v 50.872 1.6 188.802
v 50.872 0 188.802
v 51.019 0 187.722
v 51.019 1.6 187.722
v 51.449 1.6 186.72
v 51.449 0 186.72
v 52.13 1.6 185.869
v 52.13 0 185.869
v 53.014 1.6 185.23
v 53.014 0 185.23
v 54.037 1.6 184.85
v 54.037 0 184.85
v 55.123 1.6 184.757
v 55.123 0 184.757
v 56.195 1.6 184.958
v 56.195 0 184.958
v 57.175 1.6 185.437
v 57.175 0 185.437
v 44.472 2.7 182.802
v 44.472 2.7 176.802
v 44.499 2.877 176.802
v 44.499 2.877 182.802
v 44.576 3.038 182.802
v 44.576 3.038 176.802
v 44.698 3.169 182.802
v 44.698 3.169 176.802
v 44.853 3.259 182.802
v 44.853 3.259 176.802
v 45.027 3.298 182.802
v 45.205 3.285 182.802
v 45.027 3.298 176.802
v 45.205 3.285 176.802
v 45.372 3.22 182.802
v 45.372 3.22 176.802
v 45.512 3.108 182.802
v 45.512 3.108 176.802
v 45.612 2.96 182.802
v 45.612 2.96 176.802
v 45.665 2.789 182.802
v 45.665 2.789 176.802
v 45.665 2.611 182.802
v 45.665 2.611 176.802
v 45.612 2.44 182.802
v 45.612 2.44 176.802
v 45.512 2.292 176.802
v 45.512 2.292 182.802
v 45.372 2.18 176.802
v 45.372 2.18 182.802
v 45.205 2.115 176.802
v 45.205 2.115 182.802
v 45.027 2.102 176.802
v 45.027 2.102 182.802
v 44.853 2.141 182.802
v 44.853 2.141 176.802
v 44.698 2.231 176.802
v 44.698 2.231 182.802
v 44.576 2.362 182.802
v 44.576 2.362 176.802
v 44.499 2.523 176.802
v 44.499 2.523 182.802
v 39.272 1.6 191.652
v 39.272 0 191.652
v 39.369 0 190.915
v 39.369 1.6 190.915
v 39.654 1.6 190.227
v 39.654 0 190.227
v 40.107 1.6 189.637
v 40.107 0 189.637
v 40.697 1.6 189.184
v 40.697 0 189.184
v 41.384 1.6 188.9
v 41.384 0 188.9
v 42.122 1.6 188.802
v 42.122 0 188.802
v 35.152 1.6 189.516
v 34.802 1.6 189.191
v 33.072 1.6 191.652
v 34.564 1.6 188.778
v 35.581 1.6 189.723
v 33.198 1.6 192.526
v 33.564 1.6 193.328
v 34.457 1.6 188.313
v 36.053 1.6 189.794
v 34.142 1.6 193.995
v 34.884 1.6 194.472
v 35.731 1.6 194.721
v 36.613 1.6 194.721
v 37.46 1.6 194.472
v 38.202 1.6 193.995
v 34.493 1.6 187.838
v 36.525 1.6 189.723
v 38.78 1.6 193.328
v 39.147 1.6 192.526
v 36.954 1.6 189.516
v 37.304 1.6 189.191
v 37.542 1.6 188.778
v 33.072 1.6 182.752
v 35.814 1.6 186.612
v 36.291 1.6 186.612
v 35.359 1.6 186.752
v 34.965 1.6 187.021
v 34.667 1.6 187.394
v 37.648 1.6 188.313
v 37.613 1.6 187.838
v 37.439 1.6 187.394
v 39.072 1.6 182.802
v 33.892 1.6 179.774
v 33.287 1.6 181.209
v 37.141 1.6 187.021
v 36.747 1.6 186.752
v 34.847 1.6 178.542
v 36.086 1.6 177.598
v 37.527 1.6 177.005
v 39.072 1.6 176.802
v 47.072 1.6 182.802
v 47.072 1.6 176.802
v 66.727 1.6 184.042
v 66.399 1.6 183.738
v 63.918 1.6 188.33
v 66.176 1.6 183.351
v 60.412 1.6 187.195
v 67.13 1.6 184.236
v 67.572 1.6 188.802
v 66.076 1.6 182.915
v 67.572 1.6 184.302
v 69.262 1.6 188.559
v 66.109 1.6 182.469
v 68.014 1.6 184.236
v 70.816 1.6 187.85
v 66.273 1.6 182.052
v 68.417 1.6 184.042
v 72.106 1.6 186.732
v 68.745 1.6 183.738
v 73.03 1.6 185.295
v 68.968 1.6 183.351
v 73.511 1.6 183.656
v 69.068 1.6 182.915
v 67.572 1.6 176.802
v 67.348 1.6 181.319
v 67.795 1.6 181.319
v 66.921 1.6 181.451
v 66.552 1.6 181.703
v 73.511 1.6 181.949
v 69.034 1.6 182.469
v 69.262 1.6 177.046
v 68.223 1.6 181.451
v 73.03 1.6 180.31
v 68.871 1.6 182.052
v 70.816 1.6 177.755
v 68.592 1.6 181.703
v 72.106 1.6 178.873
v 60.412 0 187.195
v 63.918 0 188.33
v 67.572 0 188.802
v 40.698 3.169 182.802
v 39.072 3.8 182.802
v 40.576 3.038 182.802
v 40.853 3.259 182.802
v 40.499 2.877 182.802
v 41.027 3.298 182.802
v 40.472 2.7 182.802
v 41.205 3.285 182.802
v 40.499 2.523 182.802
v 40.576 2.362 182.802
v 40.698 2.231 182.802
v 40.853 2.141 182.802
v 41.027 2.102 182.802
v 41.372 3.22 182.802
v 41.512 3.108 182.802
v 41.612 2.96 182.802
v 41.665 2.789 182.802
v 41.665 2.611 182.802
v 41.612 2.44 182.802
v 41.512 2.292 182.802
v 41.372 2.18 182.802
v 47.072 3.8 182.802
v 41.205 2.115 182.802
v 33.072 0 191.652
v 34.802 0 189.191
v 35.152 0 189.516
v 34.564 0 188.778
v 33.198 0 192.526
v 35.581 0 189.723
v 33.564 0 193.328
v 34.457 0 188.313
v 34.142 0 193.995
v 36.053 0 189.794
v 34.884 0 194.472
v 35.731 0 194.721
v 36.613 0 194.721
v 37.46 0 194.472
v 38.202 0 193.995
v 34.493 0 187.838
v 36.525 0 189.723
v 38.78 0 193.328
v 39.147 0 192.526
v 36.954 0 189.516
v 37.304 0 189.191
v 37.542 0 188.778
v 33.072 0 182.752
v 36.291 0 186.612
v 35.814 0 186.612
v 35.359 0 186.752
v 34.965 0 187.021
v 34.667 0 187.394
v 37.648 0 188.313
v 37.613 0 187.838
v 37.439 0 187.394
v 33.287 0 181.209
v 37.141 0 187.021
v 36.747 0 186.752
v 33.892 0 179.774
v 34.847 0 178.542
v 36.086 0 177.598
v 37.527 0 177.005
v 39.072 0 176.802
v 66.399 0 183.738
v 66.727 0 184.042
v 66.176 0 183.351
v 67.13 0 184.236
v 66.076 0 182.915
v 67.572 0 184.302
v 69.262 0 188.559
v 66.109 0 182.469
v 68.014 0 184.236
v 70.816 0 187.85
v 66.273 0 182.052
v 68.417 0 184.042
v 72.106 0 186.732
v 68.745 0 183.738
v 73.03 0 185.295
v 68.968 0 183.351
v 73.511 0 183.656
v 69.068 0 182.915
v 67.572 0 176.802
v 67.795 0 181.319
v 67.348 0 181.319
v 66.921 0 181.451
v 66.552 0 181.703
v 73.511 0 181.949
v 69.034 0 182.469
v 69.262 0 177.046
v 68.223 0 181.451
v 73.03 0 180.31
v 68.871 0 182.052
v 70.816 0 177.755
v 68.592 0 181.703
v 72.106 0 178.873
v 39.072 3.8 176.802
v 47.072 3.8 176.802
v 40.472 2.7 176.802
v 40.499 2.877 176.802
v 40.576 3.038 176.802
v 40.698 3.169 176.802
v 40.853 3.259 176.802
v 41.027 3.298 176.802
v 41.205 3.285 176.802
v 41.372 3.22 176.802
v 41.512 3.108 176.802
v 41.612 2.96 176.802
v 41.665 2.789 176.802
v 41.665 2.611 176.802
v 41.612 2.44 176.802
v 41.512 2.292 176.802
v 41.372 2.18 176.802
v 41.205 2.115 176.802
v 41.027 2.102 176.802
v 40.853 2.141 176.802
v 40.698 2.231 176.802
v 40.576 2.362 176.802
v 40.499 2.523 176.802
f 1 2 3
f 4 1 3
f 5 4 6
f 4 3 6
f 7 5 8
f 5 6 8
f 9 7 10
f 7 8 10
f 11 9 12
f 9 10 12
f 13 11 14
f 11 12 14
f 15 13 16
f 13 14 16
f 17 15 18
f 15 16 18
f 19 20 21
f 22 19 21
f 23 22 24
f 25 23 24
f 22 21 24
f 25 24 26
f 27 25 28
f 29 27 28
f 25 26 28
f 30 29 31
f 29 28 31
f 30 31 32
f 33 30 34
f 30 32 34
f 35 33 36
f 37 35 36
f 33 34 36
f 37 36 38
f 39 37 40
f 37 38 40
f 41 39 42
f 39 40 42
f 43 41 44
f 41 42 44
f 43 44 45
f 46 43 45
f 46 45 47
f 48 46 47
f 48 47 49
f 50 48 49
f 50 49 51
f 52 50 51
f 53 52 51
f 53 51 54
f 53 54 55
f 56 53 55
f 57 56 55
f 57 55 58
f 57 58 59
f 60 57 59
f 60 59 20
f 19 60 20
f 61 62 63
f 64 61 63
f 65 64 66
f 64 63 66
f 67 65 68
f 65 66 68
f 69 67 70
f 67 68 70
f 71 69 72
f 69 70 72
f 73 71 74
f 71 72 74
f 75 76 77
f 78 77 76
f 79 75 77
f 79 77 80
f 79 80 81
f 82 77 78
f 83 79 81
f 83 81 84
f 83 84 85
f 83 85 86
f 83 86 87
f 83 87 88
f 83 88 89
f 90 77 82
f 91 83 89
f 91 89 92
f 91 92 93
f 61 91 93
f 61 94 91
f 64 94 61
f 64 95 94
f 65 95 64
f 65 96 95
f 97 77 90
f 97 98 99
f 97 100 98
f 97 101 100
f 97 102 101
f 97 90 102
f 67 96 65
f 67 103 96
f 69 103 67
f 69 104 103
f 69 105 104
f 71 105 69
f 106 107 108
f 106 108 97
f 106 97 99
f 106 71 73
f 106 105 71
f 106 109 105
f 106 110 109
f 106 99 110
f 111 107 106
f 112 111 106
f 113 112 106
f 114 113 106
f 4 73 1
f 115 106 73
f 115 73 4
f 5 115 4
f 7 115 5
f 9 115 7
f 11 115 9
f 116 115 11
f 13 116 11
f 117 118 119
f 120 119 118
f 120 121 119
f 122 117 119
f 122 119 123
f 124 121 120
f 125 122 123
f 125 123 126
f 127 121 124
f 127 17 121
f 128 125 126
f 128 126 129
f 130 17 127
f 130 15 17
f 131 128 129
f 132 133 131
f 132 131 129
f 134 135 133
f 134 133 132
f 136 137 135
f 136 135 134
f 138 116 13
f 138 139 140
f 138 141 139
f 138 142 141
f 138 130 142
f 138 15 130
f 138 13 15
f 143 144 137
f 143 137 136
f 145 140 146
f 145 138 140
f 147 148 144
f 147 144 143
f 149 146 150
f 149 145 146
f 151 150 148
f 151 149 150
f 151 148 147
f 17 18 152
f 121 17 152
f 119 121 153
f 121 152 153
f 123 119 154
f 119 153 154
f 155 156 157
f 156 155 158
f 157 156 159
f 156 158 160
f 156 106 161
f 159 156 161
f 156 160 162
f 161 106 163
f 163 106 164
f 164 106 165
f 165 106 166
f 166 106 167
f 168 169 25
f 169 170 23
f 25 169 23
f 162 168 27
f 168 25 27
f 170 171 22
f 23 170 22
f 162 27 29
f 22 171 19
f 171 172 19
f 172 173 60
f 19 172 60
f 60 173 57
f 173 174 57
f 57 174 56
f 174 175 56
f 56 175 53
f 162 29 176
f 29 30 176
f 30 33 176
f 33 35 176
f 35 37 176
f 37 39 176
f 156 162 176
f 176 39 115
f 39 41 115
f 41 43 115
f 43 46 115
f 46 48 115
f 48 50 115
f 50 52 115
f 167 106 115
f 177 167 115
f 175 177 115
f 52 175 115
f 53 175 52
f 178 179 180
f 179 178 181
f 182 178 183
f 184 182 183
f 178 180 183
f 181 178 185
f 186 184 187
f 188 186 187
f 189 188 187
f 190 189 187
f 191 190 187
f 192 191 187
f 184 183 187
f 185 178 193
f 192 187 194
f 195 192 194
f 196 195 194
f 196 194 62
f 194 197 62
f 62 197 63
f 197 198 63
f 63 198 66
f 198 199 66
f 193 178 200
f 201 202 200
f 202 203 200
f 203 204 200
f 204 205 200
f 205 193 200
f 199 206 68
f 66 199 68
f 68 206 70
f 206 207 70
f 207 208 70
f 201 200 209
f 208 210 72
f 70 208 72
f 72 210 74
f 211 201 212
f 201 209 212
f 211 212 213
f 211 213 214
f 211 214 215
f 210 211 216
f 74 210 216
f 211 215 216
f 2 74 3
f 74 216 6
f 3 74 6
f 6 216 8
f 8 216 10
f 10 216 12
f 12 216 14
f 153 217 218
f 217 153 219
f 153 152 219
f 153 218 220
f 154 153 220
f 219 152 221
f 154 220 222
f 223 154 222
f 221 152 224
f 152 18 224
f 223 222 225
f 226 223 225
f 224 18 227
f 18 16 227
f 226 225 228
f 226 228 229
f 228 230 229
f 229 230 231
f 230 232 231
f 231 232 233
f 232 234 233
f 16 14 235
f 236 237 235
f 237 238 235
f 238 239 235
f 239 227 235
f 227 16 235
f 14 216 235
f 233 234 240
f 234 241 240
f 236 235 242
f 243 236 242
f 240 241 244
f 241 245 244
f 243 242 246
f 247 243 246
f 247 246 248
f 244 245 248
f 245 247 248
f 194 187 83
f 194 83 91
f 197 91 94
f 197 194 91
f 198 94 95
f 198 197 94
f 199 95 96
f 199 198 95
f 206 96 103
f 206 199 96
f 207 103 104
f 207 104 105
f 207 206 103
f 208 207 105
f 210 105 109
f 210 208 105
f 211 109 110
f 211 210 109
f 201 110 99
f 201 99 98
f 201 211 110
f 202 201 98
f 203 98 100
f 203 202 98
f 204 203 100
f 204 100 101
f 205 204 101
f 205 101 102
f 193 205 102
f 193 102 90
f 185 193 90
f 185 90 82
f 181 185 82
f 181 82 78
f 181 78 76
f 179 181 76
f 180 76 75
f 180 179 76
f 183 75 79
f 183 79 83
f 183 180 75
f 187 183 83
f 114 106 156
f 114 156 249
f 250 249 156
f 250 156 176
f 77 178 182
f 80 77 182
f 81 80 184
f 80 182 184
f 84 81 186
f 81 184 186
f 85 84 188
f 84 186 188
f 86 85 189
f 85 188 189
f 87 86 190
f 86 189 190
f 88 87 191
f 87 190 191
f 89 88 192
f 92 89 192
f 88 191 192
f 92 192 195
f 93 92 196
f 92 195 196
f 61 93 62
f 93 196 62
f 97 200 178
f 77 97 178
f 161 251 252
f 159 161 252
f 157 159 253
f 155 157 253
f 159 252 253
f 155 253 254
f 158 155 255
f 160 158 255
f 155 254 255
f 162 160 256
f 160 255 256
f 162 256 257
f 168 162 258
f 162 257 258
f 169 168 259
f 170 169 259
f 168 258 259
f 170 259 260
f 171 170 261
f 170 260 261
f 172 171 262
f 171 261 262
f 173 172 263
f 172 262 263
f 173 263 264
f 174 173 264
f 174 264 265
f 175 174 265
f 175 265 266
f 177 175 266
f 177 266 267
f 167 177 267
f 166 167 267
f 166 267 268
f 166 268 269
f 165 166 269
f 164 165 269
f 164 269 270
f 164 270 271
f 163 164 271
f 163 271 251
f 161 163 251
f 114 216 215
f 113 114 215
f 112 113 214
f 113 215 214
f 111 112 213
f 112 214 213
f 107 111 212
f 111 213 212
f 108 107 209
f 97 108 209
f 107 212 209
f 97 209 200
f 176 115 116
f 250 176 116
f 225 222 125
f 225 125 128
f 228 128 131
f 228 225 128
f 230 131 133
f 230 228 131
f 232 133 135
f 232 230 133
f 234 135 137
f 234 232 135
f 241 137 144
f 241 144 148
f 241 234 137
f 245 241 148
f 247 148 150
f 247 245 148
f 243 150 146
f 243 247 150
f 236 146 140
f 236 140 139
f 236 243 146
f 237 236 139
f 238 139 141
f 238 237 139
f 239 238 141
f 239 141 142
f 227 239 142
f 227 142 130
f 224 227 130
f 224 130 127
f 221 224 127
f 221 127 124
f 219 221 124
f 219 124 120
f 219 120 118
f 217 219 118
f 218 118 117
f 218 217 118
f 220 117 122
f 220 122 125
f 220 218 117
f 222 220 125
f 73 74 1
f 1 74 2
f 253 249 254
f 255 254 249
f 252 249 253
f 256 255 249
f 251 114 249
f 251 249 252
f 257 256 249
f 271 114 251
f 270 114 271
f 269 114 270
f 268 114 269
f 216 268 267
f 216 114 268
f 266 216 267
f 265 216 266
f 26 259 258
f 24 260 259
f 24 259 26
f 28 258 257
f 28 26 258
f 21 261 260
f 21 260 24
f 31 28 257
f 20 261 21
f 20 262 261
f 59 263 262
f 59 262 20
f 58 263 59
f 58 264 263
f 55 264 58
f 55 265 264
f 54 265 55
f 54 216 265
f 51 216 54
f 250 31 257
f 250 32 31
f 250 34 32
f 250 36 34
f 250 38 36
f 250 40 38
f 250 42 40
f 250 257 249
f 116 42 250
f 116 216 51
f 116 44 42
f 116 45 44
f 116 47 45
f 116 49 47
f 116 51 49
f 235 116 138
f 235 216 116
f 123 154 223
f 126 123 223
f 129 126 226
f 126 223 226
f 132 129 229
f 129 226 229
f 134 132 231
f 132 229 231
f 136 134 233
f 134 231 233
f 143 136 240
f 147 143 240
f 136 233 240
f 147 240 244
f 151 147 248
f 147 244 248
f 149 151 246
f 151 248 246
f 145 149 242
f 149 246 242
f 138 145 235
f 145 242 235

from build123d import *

# Parameters (mm, degrees)
SKETCH1_R           = 1.5
SKETCH1_R_2         = 1.6
BOSS_EXTRUDE1_DEPTH = 1.6
SKETCH2_W           = 8
SKETCH2_H           = 6
BOSS_EXTRUDE2_DEPTH = 2.2
CUT_EXTRUDE1_REACH  = 77.825
SKETCH3_R           = 0.6
FILLET1_R           = 20


with BuildPart() as part:
    # Sketch1 → Boss-Extrude1 (new body)
    with BuildSketch(Plane(origin=(0, 0, 0), x_dir=(1, 0, 0), z_dir=(0, 1, 0))):
        with BuildLine():
            Line((33.072085441, -182.752493772), (33.072085441, -191.652493772))
            ThreePointArc((33.072085441, -191.652493772), (36.172085441, -194.752493772), (39.272085441, -191.652493772))
            ThreePointArc((39.272085441, -191.652493772), (40.106831114, -189.637239445), (42.122085441, -188.802493772))
            Line((42.122085441, -188.802493772), (50.872085441, -188.802493772))
            ThreePointArc((50.872085441, -188.802493772), (54.922085441, -184.752493772), (58.972085441, -188.802493772))
            Line((58.972085441, -188.802493772), (67.571877104, -188.802493772))
            ThreePointArc((67.571877104, -188.802493772), (73.571877104, -182.802493772), (67.571877104, -176.802493772))
            Line((67.571877104, -176.802493772), (39.071877104, -176.802493772))
            ThreePointArc((39.071877104, -176.802493772), (34.846951069, -178.542212091), (33.072085441, -182.752493772))
        make_face()
        with Locations(Location((67.571877104, -182.802493772, 0), (0, 0, 270))):
            Circle(SKETCH1_R, mode=Mode.SUBTRACT)
        with Locations(Location((36.052926365, -188.193770201, 0), (0, 0, 270))):
            Circle(SKETCH1_R_2, mode=Mode.SUBTRACT)
    extrude(amount=BOSS_EXTRUDE1_DEPTH)

    # Sketch2 → Boss-Extrude2 (add)
    with BuildSketch(Plane(origin=(0, 1.6, 0), x_dir=(1, 0, 0), z_dir=(0, 1, 0))):
        with Locations((43.071877104, -179.802493772)):
            Rectangle(SKETCH2_W, SKETCH2_H)
    extrude(amount=BOSS_EXTRUDE2_DEPTH)

    # Sketch3 → Cut-Extrude1 (cut, up to next)
    with BuildSketch(Plane(origin=(0, 0, 176.802493772), x_dir=(-1, 0, 0), z_dir=(0, 0, -1)), mode=Mode.PRIVATE) as cut_extrude1_sk1:
        with Locations((-45.071877104, 2.7)):
            Circle(SKETCH3_R)
    cut_extrude1_tool1 = extrude(cut_extrude1_sk1.sketch, amount=-CUT_EXTRUDE1_REACH, mode=Mode.PRIVATE) & part.part
    # Sketch3 → Cut-Extrude1 (cut, up to next)
    with BuildSketch(Plane(origin=(0, 0, 176.802493772), x_dir=(-1, 0, 0), z_dir=(0, 0, -1)), mode=Mode.PRIVATE) as cut_extrude1_sk2:
        with Locations((-41.071877104, 2.7)):
            Circle(SKETCH3_R)
    cut_extrude1_tool2 = extrude(cut_extrude1_sk2.sketch, amount=-CUT_EXTRUDE1_REACH, mode=Mode.PRIVATE) & part.part
    add(cut_extrude1_tool1.solids().sort_by_distance((45.071877, 2.7, 176.802494))[0], mode=Mode.SUBTRACT)
    add(cut_extrude1_tool2.solids().sort_by_distance((41.071877, 2.7, 176.802494))[0], mode=Mode.SUBTRACT)

    # Fillet1
    # the kernel refuses this fillet: 20 mm, written as the material it takes off along each edge
    with BuildSketch(Plane(origin=(58.972085441, -21.499479158, 188.802493772), x_dir=(-0.47106518434260986, 0, -0.8820984027308195), z_dir=(0, 1, 0))) as fillet1_piece_1:
        with BuildLine():
            CenterArc((13.23693168, -17.641968055), FILLET1_R, 118.103462193, 31.710767892)
            Line((-4.051062445, -7.58586249), (0, 0))
            ThreePointArc((0, 0), (1.907813997, -0.477501469), (3.815627993, 0))
        make_face()
    extrude(amount=44.598958315, mode=Mode.SUBTRACT)


solid = part.part
